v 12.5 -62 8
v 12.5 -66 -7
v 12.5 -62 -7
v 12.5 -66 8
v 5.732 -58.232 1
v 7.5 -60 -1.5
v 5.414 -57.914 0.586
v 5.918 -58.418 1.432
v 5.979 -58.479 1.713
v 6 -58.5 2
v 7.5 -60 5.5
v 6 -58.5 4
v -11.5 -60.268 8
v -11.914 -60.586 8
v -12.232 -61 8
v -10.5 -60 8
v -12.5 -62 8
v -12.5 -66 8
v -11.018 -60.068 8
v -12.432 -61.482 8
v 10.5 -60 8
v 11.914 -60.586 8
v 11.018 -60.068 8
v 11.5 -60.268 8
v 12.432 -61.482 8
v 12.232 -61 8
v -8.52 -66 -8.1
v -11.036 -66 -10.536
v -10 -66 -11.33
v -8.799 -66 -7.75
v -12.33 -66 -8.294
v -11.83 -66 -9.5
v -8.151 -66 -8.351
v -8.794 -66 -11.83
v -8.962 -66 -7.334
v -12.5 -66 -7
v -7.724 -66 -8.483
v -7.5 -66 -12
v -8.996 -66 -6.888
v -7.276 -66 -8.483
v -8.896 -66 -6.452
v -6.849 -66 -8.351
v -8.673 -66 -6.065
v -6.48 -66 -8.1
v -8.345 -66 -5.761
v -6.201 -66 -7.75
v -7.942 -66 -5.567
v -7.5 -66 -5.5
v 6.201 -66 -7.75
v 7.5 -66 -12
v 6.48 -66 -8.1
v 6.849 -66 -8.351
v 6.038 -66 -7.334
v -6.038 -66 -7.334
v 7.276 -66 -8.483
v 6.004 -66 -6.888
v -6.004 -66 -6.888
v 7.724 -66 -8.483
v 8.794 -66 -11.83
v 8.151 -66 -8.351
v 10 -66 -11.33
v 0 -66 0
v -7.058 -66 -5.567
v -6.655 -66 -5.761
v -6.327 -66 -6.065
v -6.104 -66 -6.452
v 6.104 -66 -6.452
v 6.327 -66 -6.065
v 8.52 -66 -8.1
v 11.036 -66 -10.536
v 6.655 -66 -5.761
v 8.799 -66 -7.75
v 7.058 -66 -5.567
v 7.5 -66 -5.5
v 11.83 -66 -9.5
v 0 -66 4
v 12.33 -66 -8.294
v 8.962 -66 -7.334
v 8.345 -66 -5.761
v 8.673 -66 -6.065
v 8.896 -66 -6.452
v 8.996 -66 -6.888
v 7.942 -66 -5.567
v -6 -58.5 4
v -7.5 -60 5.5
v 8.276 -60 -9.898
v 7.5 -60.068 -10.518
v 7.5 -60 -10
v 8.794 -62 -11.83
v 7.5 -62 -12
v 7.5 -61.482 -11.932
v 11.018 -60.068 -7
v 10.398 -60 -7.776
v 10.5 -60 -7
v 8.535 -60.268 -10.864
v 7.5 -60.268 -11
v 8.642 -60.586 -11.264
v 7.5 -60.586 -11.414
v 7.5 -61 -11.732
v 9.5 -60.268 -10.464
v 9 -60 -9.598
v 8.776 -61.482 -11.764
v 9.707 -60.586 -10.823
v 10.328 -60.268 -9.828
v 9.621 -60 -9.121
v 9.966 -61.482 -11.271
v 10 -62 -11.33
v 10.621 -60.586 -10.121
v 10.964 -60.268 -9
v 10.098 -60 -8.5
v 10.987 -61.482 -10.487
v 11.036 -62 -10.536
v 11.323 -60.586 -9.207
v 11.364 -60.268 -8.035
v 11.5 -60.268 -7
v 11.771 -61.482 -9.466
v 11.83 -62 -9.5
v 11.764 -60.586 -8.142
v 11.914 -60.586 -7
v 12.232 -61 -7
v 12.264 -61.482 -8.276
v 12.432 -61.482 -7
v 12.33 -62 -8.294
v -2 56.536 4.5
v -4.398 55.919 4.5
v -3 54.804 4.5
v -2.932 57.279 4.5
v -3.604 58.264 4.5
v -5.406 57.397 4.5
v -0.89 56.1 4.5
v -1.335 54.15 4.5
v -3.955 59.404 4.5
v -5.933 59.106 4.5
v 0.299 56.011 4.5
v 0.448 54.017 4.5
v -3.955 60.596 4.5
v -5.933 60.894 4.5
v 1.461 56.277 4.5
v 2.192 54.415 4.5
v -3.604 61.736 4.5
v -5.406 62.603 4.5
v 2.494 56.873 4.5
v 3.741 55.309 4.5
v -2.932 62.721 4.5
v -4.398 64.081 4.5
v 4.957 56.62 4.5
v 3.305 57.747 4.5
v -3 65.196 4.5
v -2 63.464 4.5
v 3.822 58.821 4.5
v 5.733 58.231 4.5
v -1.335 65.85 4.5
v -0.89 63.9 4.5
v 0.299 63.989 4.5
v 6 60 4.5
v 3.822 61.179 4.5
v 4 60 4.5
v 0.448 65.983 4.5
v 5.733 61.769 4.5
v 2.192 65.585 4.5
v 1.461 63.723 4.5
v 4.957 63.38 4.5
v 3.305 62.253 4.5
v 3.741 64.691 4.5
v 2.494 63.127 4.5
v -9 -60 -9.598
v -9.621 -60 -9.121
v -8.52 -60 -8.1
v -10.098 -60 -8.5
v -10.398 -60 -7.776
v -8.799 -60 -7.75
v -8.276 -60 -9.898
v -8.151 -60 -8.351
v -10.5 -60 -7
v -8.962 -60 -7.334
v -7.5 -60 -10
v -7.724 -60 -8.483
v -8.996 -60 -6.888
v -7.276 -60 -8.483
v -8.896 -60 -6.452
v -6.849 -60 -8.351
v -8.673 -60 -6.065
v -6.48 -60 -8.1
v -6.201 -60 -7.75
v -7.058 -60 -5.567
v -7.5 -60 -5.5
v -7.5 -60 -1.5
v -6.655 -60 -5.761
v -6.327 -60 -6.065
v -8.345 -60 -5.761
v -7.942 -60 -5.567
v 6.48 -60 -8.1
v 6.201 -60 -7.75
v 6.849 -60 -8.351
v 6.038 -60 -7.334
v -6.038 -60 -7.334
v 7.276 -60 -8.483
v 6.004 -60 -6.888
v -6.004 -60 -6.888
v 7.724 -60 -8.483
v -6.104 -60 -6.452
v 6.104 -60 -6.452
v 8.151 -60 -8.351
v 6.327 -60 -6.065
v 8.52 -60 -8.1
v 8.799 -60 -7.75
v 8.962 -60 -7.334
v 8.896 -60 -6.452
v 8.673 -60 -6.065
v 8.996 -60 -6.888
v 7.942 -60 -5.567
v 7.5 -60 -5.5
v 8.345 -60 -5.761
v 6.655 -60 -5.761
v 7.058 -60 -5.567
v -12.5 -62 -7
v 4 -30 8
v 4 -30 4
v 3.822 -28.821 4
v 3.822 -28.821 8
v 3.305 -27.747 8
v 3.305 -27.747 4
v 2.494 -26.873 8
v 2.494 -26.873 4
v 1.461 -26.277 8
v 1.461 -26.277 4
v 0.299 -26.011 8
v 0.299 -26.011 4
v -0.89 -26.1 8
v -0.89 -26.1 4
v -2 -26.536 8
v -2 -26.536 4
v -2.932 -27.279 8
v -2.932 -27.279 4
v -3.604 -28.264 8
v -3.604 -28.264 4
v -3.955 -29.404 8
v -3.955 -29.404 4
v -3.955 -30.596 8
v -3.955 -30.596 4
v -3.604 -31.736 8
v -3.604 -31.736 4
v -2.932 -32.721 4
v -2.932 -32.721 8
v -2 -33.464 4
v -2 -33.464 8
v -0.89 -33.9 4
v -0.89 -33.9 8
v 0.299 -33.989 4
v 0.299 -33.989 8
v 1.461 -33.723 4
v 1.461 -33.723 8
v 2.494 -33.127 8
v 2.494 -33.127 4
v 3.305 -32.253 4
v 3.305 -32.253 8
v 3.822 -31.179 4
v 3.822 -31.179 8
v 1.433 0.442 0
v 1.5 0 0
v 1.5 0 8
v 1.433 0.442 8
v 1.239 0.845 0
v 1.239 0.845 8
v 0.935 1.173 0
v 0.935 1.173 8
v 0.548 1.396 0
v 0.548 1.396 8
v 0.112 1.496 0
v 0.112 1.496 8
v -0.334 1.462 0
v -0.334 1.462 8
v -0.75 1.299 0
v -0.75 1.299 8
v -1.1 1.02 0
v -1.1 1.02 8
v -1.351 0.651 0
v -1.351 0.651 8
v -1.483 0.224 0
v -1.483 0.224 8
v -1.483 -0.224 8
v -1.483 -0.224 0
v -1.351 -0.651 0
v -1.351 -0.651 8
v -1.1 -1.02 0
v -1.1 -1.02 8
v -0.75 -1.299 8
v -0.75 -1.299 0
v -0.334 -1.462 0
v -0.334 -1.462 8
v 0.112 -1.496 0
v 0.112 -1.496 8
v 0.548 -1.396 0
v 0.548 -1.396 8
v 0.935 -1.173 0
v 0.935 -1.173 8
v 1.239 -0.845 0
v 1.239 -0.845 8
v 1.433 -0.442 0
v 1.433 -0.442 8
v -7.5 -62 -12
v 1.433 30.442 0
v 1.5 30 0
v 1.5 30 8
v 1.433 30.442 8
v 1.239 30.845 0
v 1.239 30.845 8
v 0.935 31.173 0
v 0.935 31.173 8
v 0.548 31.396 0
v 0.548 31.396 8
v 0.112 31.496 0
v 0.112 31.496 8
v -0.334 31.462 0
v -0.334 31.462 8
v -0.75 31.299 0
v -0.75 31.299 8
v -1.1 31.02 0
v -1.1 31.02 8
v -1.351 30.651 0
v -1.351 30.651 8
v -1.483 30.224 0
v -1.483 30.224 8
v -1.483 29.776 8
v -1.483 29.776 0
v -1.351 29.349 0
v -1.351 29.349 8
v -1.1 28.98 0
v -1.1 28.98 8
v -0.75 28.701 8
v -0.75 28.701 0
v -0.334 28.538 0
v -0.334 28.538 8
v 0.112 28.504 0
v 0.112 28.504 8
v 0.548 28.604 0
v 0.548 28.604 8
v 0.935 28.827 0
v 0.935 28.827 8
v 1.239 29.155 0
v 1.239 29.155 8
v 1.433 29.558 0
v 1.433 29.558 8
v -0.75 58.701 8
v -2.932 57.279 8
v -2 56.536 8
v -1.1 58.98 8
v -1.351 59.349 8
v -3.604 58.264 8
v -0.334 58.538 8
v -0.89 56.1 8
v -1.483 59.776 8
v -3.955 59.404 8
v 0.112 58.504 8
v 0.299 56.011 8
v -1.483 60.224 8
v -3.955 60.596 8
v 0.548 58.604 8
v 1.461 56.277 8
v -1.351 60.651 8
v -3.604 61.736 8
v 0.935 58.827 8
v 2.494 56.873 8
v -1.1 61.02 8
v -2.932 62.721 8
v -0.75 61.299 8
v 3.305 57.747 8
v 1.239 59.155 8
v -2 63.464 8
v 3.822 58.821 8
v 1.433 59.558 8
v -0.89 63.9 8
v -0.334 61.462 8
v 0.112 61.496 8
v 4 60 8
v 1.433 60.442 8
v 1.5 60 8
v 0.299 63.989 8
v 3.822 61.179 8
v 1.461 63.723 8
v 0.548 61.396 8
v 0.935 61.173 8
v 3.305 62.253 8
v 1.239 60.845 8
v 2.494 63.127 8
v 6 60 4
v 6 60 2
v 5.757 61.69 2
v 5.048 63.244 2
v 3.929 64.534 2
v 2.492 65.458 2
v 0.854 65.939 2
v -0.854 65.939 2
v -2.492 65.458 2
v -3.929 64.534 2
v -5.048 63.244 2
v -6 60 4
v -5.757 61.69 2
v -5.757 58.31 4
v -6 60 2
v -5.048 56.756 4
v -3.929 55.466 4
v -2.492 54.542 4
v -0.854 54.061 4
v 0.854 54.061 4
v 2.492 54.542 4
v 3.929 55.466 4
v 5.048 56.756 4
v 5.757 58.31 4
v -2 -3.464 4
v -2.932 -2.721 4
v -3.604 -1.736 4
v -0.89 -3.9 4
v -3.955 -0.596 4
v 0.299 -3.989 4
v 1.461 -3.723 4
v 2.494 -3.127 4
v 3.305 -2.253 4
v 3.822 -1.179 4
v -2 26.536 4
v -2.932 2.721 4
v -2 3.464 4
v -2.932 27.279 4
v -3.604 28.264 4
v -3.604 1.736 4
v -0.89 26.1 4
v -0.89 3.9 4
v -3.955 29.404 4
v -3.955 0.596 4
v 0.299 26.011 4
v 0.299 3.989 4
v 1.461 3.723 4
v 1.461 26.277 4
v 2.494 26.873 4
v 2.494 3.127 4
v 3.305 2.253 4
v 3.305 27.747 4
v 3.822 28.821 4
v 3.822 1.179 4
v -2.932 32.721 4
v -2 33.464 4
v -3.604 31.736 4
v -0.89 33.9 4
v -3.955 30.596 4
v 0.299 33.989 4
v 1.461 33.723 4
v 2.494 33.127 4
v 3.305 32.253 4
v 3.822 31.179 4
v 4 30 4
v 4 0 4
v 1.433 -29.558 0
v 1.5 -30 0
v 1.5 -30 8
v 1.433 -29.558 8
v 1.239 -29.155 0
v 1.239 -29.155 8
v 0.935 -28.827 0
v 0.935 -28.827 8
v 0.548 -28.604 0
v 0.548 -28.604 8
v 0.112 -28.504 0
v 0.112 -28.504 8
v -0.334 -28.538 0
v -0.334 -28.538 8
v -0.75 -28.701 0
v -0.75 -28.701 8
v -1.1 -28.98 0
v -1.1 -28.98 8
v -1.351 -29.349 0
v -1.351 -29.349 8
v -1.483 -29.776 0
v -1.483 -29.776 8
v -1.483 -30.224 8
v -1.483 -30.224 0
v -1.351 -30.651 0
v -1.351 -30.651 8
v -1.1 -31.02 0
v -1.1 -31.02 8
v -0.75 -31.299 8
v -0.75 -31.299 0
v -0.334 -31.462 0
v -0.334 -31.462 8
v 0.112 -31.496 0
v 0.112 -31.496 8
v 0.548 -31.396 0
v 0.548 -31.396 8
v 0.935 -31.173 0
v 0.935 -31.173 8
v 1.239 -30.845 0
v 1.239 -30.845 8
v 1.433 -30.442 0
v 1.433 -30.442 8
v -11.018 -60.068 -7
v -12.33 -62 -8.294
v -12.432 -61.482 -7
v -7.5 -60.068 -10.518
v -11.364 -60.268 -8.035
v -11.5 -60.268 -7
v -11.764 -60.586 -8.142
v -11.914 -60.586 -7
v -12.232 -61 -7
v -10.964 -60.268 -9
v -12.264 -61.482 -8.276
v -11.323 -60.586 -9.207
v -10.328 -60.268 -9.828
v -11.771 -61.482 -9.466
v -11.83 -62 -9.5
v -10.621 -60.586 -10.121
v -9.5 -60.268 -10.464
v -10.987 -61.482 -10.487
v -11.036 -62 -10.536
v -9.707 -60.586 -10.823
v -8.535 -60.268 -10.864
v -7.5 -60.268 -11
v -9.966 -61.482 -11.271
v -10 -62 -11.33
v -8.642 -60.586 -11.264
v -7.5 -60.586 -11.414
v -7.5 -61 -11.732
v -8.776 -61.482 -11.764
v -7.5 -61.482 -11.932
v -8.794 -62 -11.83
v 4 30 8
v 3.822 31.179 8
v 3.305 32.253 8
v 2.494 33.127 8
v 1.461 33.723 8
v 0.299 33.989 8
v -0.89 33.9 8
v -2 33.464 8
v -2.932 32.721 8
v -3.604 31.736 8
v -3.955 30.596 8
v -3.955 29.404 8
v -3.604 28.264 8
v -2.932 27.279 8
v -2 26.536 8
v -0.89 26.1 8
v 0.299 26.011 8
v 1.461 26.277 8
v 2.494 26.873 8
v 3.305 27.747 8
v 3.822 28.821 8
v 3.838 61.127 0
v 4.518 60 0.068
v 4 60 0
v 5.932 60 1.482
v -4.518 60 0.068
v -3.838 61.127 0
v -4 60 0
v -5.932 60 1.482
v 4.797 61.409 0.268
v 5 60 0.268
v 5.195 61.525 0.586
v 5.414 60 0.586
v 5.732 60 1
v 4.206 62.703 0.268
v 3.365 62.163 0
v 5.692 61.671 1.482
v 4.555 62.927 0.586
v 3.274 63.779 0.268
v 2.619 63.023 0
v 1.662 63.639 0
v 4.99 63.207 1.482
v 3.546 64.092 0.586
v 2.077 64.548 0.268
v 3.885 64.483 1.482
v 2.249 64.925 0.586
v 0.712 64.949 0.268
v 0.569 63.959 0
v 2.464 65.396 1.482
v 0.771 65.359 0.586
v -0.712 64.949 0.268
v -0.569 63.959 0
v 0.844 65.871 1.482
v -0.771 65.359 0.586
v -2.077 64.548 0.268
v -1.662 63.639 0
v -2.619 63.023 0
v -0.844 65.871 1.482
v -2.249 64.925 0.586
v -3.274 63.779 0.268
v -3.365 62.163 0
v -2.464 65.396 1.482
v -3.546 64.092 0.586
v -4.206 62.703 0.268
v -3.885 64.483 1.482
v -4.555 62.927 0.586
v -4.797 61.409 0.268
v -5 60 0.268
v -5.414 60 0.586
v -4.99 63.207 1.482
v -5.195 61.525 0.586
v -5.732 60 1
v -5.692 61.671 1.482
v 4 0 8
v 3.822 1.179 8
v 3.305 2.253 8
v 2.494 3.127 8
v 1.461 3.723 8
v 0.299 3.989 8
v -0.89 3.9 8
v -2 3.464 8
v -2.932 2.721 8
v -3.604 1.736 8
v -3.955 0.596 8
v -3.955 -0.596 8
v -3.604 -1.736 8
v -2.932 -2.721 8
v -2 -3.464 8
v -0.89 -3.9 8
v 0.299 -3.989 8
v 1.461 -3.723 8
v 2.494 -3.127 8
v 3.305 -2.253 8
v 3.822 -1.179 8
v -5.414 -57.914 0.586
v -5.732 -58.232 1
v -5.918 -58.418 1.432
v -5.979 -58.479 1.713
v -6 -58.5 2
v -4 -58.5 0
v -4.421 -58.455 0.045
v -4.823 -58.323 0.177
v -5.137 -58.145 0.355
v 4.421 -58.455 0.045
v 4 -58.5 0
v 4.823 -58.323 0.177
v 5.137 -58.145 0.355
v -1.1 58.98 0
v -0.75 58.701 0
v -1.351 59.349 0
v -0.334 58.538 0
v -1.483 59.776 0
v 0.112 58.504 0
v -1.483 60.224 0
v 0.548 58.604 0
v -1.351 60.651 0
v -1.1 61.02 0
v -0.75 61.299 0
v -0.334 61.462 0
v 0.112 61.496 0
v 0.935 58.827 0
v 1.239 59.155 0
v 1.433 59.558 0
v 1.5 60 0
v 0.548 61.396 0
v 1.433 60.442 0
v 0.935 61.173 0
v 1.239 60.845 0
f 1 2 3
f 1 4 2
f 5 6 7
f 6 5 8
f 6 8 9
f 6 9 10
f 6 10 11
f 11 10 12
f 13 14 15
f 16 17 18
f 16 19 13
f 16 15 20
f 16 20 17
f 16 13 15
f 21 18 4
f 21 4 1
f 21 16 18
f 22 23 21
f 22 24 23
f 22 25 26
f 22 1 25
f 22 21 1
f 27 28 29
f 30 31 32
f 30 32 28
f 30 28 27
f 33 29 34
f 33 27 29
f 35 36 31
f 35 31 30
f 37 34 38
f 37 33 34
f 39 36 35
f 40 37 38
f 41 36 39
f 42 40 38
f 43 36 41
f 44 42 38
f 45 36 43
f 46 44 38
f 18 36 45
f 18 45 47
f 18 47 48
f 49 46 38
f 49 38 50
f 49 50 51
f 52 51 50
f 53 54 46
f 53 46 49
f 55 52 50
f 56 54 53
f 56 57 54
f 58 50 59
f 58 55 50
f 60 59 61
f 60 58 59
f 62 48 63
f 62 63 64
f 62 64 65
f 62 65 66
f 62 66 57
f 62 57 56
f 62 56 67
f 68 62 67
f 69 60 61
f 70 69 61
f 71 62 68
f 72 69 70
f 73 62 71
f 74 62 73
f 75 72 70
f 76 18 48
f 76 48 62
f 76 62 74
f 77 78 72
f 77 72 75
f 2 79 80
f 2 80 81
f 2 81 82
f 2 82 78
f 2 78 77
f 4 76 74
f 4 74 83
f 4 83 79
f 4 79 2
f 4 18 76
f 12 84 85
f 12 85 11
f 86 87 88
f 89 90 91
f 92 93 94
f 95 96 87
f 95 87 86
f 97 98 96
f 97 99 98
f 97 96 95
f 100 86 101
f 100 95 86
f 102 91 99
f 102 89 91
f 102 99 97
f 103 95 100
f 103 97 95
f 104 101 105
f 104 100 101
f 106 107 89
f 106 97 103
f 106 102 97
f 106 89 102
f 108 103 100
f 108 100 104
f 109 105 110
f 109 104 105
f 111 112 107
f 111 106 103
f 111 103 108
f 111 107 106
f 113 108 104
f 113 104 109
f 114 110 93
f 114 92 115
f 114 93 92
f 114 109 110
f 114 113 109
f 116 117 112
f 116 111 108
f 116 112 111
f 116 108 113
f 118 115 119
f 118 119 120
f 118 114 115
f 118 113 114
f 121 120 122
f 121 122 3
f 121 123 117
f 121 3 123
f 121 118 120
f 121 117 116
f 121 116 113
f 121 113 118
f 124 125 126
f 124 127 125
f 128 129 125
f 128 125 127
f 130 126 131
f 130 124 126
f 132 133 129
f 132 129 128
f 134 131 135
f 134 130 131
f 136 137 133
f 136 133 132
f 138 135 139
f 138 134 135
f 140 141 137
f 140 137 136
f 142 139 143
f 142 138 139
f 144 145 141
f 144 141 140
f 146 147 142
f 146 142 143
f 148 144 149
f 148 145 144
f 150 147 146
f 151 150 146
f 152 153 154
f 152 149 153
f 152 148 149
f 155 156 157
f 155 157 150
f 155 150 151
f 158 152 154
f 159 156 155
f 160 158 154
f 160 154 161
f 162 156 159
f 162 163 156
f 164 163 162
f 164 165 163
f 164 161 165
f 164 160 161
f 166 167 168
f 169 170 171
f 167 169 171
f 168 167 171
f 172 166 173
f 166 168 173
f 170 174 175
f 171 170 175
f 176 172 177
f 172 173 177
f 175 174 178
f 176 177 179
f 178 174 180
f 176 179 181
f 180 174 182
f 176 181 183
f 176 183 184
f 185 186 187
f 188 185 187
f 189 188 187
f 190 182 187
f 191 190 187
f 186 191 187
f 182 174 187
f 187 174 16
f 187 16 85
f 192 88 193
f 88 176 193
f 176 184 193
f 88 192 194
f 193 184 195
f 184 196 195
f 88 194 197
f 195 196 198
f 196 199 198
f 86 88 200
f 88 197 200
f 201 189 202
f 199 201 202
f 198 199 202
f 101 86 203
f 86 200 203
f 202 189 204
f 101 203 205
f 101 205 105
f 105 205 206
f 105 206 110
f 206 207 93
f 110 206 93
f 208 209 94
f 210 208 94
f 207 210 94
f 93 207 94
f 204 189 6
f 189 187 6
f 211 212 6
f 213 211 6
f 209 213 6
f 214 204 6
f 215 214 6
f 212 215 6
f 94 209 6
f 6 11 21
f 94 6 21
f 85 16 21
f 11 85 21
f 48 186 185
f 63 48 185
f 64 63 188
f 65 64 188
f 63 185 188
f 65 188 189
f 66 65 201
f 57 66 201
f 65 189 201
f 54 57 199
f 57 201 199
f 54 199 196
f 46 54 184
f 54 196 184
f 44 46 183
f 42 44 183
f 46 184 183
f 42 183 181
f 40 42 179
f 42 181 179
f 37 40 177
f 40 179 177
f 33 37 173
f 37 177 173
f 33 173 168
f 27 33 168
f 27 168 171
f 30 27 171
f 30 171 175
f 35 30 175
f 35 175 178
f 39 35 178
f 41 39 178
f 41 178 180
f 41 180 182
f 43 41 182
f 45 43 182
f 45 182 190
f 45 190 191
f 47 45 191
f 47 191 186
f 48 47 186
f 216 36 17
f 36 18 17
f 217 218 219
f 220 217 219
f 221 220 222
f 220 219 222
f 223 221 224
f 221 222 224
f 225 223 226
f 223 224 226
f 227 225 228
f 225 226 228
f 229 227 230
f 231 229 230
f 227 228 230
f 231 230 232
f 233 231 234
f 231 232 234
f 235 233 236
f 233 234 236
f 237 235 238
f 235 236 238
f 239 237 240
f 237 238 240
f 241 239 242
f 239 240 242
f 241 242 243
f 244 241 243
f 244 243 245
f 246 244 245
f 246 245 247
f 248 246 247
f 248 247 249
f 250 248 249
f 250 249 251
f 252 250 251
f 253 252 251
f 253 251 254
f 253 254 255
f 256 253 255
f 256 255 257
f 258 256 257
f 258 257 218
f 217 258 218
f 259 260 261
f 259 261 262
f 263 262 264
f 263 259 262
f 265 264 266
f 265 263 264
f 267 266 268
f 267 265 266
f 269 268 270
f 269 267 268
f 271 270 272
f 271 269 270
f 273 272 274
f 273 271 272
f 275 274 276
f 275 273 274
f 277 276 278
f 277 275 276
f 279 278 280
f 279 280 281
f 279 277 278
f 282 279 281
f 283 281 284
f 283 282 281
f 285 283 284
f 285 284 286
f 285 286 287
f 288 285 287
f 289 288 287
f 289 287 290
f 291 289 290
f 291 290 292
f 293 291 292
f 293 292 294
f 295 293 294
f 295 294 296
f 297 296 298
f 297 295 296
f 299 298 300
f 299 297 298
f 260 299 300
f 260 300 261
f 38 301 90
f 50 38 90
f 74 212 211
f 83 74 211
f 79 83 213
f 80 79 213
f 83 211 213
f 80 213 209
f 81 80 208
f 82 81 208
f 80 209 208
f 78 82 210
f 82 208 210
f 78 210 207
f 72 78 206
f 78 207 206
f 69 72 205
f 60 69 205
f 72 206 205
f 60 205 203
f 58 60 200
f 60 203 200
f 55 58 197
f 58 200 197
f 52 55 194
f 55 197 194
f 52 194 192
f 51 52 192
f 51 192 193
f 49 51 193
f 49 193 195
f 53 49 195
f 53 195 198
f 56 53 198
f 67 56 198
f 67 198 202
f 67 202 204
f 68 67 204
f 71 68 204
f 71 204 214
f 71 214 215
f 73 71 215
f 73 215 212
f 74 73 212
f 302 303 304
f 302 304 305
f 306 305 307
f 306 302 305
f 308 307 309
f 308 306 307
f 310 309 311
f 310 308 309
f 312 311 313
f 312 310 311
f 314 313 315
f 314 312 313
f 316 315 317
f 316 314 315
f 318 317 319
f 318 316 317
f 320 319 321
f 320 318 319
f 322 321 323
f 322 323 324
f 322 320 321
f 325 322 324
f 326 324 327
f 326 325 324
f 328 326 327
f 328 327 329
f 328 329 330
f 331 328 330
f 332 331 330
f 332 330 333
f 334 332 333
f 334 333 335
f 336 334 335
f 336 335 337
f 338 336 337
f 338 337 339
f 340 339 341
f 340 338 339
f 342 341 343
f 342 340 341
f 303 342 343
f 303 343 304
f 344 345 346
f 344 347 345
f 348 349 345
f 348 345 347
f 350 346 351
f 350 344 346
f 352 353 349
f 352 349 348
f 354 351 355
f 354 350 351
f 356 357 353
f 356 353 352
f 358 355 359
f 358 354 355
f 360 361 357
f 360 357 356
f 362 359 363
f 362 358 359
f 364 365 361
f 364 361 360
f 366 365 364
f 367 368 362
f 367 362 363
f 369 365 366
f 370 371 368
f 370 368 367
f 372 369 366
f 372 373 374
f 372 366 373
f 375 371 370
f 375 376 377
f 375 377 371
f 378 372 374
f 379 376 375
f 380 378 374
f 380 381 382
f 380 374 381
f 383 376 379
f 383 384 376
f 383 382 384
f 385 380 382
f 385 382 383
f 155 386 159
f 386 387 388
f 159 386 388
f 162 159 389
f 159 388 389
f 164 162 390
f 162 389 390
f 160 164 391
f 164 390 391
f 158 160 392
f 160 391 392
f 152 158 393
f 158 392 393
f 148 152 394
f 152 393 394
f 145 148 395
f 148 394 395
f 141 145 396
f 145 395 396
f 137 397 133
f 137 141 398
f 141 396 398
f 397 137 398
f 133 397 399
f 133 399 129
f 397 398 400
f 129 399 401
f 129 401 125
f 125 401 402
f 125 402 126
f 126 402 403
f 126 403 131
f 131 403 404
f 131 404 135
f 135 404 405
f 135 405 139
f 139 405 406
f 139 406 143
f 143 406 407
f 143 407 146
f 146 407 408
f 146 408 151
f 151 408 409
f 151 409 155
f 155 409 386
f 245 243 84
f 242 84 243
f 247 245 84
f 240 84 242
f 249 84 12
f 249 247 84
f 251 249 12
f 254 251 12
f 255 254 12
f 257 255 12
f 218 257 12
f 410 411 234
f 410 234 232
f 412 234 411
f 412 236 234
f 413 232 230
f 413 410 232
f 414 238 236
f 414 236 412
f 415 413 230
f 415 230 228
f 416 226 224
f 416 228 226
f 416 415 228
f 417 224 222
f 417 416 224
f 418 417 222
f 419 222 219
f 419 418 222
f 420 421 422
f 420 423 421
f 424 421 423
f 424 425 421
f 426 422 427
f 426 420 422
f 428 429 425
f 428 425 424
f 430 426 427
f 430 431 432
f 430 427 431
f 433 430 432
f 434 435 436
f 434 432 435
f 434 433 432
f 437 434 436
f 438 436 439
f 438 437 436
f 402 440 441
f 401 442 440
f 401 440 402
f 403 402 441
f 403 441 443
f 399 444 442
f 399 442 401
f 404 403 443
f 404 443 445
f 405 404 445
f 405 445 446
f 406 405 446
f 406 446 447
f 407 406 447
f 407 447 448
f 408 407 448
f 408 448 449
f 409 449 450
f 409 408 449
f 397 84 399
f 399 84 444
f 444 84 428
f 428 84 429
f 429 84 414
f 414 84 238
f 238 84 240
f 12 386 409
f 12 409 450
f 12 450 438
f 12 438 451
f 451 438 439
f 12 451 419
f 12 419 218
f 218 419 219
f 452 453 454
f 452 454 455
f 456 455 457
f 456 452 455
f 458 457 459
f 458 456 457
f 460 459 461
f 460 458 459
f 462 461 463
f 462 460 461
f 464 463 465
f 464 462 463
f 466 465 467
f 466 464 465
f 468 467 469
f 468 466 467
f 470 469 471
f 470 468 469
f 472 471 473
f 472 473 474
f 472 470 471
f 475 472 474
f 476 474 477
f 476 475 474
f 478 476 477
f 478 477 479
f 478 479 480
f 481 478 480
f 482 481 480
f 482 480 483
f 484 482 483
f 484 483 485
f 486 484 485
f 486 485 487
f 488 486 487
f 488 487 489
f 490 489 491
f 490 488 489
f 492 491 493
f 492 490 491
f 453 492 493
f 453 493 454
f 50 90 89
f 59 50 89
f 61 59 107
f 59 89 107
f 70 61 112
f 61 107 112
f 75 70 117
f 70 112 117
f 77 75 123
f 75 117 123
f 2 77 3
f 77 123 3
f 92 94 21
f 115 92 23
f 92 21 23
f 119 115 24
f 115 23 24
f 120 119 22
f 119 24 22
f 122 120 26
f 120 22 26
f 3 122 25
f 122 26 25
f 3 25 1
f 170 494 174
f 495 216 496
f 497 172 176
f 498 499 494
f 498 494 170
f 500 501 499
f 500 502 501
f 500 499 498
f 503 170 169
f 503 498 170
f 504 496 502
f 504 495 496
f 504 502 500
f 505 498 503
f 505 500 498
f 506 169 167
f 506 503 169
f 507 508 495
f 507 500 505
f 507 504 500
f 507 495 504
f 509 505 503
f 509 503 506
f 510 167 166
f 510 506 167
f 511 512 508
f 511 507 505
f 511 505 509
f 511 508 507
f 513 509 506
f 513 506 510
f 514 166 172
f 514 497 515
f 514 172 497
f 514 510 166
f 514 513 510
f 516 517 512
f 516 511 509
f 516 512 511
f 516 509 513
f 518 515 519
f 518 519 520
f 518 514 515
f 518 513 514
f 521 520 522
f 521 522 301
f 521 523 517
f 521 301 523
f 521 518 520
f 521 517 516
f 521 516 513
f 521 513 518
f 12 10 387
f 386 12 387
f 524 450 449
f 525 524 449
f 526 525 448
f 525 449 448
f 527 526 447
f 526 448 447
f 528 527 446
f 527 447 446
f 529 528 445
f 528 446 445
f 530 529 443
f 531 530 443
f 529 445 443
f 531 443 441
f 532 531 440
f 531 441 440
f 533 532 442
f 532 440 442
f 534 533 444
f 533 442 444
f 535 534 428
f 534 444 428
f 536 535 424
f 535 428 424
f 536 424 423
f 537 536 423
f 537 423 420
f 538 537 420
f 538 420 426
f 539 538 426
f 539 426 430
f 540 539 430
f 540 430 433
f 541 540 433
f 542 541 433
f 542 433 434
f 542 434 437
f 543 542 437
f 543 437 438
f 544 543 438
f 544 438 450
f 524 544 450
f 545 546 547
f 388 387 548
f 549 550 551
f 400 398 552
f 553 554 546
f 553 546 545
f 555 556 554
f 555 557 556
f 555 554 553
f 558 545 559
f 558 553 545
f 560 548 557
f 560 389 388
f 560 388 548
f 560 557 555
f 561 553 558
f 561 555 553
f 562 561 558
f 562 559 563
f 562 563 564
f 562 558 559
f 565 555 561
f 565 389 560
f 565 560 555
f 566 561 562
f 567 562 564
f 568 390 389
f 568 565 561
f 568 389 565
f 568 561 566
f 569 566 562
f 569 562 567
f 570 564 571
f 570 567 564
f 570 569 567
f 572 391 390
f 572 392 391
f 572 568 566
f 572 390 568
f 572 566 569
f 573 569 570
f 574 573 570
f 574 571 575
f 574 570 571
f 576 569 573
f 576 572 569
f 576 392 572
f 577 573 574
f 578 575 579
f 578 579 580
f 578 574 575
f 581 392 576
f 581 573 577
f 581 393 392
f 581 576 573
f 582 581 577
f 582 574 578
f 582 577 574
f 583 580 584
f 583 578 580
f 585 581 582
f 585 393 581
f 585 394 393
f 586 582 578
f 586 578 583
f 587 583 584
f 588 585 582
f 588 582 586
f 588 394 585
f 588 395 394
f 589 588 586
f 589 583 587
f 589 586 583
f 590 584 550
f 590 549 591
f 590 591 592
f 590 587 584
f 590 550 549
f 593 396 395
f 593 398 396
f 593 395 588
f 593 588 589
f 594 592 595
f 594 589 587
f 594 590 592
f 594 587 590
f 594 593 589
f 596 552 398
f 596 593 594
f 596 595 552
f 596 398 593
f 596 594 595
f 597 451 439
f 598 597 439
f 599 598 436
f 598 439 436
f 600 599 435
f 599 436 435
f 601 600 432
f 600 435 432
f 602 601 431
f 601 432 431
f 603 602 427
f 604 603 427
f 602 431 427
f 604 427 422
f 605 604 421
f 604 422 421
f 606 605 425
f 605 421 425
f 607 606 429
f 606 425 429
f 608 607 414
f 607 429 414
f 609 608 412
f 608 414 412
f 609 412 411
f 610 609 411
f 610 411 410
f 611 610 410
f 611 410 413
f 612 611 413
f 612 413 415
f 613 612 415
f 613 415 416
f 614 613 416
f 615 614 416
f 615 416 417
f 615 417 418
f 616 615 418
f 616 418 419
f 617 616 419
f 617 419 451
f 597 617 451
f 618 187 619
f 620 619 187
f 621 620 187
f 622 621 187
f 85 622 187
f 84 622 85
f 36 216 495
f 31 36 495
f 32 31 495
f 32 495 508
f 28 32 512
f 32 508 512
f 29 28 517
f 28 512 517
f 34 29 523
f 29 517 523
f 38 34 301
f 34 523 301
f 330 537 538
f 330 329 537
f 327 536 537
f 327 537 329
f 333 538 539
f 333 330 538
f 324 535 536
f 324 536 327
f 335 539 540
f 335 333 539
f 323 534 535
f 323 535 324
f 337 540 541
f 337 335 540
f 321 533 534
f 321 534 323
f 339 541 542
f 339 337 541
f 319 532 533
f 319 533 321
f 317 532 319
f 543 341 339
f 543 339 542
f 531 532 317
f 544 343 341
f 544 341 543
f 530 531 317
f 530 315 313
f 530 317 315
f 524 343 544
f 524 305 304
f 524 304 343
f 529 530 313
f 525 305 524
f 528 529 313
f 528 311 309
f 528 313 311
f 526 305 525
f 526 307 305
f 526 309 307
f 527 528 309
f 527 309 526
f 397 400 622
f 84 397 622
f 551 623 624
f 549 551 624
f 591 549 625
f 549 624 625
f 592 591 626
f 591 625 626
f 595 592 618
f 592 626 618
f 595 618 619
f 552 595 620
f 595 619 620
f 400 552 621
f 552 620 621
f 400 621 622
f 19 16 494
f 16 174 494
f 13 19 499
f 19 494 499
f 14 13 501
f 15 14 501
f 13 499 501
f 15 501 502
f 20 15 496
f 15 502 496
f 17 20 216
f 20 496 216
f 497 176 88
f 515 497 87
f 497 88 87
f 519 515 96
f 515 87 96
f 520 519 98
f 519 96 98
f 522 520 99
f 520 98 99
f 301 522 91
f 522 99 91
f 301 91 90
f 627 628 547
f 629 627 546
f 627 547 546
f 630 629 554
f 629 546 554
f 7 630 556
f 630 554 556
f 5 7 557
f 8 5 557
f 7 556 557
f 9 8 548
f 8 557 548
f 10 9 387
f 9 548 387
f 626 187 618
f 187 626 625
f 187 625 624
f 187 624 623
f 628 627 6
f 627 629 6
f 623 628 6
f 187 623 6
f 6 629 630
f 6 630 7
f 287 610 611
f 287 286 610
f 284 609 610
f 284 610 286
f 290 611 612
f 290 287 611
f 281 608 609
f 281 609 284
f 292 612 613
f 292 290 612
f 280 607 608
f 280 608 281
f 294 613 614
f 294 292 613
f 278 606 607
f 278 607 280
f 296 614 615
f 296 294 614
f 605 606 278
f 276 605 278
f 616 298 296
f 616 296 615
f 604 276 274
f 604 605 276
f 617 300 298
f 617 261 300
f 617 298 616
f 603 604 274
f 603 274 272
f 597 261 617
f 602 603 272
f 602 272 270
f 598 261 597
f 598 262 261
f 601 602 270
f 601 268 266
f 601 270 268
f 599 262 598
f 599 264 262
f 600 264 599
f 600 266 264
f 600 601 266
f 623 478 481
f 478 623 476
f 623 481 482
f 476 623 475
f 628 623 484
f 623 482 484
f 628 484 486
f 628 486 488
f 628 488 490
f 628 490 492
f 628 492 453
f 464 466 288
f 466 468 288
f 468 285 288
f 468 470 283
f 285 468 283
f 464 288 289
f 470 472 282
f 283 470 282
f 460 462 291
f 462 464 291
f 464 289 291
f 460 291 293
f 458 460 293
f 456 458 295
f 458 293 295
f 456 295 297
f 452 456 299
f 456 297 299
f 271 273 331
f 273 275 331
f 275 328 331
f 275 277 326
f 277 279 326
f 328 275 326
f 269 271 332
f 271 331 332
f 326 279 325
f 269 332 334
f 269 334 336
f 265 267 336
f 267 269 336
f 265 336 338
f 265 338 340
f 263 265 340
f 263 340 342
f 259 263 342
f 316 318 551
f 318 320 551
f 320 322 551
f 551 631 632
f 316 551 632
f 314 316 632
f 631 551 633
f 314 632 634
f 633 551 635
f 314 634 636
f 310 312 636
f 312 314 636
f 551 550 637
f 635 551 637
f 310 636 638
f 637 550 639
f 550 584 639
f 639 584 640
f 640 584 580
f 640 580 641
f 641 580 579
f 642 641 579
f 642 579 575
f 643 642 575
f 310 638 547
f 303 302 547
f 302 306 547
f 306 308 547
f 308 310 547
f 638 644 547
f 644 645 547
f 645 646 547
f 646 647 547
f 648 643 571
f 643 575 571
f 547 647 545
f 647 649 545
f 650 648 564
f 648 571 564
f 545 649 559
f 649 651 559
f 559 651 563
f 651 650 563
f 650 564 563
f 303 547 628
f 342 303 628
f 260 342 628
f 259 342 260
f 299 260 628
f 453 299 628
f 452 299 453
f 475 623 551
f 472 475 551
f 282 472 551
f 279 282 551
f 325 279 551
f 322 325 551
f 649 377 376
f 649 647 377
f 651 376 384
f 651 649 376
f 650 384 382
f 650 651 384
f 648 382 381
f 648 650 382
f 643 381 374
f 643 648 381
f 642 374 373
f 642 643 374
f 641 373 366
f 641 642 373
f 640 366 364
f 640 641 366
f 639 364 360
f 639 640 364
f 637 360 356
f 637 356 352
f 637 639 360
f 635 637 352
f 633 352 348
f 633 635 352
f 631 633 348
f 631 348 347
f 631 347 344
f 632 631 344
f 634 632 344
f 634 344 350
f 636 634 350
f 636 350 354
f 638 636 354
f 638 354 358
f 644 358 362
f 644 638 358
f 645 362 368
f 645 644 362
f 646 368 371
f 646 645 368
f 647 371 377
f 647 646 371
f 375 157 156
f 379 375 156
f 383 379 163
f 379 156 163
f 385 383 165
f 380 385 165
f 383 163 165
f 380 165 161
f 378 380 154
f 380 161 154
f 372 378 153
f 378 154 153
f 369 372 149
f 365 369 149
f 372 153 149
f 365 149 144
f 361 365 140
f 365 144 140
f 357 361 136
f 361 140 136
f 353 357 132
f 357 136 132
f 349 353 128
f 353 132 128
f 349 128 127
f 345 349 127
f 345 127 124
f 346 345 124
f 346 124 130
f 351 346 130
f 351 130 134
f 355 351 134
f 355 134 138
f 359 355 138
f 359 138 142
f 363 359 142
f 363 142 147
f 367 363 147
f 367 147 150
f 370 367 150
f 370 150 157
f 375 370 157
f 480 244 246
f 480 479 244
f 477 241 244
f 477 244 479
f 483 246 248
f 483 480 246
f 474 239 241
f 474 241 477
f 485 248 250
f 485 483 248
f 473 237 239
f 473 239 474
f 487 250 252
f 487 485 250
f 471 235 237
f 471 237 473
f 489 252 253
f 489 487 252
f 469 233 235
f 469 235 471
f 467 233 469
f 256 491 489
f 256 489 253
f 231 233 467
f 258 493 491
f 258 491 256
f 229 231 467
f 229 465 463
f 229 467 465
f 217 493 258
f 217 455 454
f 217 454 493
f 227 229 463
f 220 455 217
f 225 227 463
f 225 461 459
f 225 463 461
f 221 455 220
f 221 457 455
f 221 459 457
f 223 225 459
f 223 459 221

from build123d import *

# Parameters (mm, degrees)
SKETCH_1_R          = 4
SKETCH_1_R_2        = 1.5
EXTRUDE_1_DEPTH     = 4
SKETCH_1_4_R        = 4
SKETCH_1_4_R_2      = 1.5
EXTRUDE_3_DEPTH     = 8
SKETCH_1_5_R        = 4
EXTRUDE_4_DEPTH     = 4.5
SKETCH_2_W          = 25
SKETCH_2_H          = 6
EXTRUDE_5_DEPTH     = 20
CHAMFER_1_SIZE      = 1.5
FILLET_1_R          = 2
FILLET_2_R          = 5
FILLET_4_R          = 2
SKETCH_3_R          = 1.5
CUT_EXTRUDE_1_DEPTH = 20


with BuildPart() as part:
    # 草图1 → 凸台-拉伸1 (new body)
    with BuildSketch(Plane.XY):
        with BuildLine():
            ThreePointArc((6, 60), (0, 66), (-6, 60))
            Line((-6, 60), (-6, -60))
            ThreePointArc((-6, -60), (0, -66), (6, -60))
            Line((6, -60), (6, 60))
        make_face()
        with Locations((0, 30)):
            Circle(SKETCH_1_R, mode=Mode.SUBTRACT)
        Circle(SKETCH_1_R, mode=Mode.SUBTRACT)
        with Locations((0, -30)):
            Circle(SKETCH_1_R, mode=Mode.SUBTRACT)
        with Locations((0, 60)):
            Circle(SKETCH_1_R_2, mode=Mode.SUBTRACT)
    extrude(amount=EXTRUDE_1_DEPTH)

    # 草图1<4> → 凸台-拉伸3 (add)
    # profile 1 of 4: a face of its own
    with BuildSketch(Plane.XY):
        with Locations((0, 60)):
            Circle(SKETCH_1_4_R)
        with Locations((0, 60)):
            Circle(SKETCH_1_4_R_2, mode=Mode.SUBTRACT)
    # profile 2 of 4: a face of its own
    with BuildSketch(Plane.XY):
        with Locations((0, -30)):
            Circle(SKETCH_1_4_R)
        with Locations((0, -30)):
            Circle(SKETCH_1_4_R_2, mode=Mode.SUBTRACT)
    # profile 3 of 4: a face of its own
    with BuildSketch(Plane.XY):
        Circle(SKETCH_1_4_R)
        Circle(SKETCH_1_4_R_2, mode=Mode.SUBTRACT)
    # profile 4 of 4: a face of its own
    with BuildSketch(Plane.XY):
        with Locations((0, 30)):
            Circle(SKETCH_1_4_R)
        with Locations((0, 30)):
            Circle(SKETCH_1_4_R_2, mode=Mode.SUBTRACT)
    extrude(amount=EXTRUDE_3_DEPTH)

    # 草图1<5> → 凸台-拉伸4 (add)
    with BuildSketch(Plane.XY):
        with BuildLine():
            ThreePointArc((-6, 60), (0, 54), (6, 60))
            ThreePointArc((6, 60), (0, 66), (-6, 60))
        make_face()
        with Locations((0, 60)):
            Circle(SKETCH_1_5_R, mode=Mode.SUBTRACT)
    extrude(amount=EXTRUDE_4_DEPTH)

    # 草图2 → 凸台-拉伸5 (add)
    with BuildSketch(Plane.XY.offset(8)):
        with Locations((0, -63)):
            Rectangle(SKETCH_2_W, SKETCH_2_H)
    extrude(amount=-EXTRUDE_5_DEPTH)

    # 倒角1
    chamfer_1_edges = [part.edges().sort_by_distance(p)[0] for p in [
        (0, -60, 0),
        (-6, -60, 2),
        (0, -60, 4),
        (6, -60, 2),
    ]]
    chamfer(chamfer_1_edges, length=CHAMFER_1_SIZE)

    # 圆角1
    fillet_1_edges = [part.edges().sort_by_distance(p)[0] for p in [
        (-6, 0.75, 0),
        (0, 66, 0),
        (6, 0.75, 0),
    ]]
    fillet(fillet_1_edges, radius=FILLET_1_R)

    # 圆角2
    fillet_2_edges = [part.edges().sort_by_distance(p)[0] for p in [
        (-12.5, -63, -12),
        (12.5, -63, -12),
    ]]
    fillet(fillet_2_edges, radius=FILLET_2_R)

    # 圆角4
    fillet_4_edges = [part.edges().sort_by_distance(p)[0] for p in [
        (-11.035533906, -60, -10.535533906),
        (-12.5, -60, 0.5),
        (0, -60, -12),
        (11.035533906, -60, -10.535533906),
        (12.5, -60, 0.5),
    ]]
    fillet(fillet_4_edges, radius=FILLET_4_R)

    # 草图3 → 切除-拉伸1 (cut)
    with BuildSketch(Plane(origin=(0, -60, 0), x_dir=(1, 0, 0), z_dir=(0, 1, 0))):
        with Locations((-7.5, 7)):
            Circle(SKETCH_3_R)
        with Locations((7.5, 7)):
            Circle(SKETCH_3_R)
    extrude(amount=-CUT_EXTRUDE_1_DEPTH, mode=Mode.SUBTRACT)


solid = part.part
